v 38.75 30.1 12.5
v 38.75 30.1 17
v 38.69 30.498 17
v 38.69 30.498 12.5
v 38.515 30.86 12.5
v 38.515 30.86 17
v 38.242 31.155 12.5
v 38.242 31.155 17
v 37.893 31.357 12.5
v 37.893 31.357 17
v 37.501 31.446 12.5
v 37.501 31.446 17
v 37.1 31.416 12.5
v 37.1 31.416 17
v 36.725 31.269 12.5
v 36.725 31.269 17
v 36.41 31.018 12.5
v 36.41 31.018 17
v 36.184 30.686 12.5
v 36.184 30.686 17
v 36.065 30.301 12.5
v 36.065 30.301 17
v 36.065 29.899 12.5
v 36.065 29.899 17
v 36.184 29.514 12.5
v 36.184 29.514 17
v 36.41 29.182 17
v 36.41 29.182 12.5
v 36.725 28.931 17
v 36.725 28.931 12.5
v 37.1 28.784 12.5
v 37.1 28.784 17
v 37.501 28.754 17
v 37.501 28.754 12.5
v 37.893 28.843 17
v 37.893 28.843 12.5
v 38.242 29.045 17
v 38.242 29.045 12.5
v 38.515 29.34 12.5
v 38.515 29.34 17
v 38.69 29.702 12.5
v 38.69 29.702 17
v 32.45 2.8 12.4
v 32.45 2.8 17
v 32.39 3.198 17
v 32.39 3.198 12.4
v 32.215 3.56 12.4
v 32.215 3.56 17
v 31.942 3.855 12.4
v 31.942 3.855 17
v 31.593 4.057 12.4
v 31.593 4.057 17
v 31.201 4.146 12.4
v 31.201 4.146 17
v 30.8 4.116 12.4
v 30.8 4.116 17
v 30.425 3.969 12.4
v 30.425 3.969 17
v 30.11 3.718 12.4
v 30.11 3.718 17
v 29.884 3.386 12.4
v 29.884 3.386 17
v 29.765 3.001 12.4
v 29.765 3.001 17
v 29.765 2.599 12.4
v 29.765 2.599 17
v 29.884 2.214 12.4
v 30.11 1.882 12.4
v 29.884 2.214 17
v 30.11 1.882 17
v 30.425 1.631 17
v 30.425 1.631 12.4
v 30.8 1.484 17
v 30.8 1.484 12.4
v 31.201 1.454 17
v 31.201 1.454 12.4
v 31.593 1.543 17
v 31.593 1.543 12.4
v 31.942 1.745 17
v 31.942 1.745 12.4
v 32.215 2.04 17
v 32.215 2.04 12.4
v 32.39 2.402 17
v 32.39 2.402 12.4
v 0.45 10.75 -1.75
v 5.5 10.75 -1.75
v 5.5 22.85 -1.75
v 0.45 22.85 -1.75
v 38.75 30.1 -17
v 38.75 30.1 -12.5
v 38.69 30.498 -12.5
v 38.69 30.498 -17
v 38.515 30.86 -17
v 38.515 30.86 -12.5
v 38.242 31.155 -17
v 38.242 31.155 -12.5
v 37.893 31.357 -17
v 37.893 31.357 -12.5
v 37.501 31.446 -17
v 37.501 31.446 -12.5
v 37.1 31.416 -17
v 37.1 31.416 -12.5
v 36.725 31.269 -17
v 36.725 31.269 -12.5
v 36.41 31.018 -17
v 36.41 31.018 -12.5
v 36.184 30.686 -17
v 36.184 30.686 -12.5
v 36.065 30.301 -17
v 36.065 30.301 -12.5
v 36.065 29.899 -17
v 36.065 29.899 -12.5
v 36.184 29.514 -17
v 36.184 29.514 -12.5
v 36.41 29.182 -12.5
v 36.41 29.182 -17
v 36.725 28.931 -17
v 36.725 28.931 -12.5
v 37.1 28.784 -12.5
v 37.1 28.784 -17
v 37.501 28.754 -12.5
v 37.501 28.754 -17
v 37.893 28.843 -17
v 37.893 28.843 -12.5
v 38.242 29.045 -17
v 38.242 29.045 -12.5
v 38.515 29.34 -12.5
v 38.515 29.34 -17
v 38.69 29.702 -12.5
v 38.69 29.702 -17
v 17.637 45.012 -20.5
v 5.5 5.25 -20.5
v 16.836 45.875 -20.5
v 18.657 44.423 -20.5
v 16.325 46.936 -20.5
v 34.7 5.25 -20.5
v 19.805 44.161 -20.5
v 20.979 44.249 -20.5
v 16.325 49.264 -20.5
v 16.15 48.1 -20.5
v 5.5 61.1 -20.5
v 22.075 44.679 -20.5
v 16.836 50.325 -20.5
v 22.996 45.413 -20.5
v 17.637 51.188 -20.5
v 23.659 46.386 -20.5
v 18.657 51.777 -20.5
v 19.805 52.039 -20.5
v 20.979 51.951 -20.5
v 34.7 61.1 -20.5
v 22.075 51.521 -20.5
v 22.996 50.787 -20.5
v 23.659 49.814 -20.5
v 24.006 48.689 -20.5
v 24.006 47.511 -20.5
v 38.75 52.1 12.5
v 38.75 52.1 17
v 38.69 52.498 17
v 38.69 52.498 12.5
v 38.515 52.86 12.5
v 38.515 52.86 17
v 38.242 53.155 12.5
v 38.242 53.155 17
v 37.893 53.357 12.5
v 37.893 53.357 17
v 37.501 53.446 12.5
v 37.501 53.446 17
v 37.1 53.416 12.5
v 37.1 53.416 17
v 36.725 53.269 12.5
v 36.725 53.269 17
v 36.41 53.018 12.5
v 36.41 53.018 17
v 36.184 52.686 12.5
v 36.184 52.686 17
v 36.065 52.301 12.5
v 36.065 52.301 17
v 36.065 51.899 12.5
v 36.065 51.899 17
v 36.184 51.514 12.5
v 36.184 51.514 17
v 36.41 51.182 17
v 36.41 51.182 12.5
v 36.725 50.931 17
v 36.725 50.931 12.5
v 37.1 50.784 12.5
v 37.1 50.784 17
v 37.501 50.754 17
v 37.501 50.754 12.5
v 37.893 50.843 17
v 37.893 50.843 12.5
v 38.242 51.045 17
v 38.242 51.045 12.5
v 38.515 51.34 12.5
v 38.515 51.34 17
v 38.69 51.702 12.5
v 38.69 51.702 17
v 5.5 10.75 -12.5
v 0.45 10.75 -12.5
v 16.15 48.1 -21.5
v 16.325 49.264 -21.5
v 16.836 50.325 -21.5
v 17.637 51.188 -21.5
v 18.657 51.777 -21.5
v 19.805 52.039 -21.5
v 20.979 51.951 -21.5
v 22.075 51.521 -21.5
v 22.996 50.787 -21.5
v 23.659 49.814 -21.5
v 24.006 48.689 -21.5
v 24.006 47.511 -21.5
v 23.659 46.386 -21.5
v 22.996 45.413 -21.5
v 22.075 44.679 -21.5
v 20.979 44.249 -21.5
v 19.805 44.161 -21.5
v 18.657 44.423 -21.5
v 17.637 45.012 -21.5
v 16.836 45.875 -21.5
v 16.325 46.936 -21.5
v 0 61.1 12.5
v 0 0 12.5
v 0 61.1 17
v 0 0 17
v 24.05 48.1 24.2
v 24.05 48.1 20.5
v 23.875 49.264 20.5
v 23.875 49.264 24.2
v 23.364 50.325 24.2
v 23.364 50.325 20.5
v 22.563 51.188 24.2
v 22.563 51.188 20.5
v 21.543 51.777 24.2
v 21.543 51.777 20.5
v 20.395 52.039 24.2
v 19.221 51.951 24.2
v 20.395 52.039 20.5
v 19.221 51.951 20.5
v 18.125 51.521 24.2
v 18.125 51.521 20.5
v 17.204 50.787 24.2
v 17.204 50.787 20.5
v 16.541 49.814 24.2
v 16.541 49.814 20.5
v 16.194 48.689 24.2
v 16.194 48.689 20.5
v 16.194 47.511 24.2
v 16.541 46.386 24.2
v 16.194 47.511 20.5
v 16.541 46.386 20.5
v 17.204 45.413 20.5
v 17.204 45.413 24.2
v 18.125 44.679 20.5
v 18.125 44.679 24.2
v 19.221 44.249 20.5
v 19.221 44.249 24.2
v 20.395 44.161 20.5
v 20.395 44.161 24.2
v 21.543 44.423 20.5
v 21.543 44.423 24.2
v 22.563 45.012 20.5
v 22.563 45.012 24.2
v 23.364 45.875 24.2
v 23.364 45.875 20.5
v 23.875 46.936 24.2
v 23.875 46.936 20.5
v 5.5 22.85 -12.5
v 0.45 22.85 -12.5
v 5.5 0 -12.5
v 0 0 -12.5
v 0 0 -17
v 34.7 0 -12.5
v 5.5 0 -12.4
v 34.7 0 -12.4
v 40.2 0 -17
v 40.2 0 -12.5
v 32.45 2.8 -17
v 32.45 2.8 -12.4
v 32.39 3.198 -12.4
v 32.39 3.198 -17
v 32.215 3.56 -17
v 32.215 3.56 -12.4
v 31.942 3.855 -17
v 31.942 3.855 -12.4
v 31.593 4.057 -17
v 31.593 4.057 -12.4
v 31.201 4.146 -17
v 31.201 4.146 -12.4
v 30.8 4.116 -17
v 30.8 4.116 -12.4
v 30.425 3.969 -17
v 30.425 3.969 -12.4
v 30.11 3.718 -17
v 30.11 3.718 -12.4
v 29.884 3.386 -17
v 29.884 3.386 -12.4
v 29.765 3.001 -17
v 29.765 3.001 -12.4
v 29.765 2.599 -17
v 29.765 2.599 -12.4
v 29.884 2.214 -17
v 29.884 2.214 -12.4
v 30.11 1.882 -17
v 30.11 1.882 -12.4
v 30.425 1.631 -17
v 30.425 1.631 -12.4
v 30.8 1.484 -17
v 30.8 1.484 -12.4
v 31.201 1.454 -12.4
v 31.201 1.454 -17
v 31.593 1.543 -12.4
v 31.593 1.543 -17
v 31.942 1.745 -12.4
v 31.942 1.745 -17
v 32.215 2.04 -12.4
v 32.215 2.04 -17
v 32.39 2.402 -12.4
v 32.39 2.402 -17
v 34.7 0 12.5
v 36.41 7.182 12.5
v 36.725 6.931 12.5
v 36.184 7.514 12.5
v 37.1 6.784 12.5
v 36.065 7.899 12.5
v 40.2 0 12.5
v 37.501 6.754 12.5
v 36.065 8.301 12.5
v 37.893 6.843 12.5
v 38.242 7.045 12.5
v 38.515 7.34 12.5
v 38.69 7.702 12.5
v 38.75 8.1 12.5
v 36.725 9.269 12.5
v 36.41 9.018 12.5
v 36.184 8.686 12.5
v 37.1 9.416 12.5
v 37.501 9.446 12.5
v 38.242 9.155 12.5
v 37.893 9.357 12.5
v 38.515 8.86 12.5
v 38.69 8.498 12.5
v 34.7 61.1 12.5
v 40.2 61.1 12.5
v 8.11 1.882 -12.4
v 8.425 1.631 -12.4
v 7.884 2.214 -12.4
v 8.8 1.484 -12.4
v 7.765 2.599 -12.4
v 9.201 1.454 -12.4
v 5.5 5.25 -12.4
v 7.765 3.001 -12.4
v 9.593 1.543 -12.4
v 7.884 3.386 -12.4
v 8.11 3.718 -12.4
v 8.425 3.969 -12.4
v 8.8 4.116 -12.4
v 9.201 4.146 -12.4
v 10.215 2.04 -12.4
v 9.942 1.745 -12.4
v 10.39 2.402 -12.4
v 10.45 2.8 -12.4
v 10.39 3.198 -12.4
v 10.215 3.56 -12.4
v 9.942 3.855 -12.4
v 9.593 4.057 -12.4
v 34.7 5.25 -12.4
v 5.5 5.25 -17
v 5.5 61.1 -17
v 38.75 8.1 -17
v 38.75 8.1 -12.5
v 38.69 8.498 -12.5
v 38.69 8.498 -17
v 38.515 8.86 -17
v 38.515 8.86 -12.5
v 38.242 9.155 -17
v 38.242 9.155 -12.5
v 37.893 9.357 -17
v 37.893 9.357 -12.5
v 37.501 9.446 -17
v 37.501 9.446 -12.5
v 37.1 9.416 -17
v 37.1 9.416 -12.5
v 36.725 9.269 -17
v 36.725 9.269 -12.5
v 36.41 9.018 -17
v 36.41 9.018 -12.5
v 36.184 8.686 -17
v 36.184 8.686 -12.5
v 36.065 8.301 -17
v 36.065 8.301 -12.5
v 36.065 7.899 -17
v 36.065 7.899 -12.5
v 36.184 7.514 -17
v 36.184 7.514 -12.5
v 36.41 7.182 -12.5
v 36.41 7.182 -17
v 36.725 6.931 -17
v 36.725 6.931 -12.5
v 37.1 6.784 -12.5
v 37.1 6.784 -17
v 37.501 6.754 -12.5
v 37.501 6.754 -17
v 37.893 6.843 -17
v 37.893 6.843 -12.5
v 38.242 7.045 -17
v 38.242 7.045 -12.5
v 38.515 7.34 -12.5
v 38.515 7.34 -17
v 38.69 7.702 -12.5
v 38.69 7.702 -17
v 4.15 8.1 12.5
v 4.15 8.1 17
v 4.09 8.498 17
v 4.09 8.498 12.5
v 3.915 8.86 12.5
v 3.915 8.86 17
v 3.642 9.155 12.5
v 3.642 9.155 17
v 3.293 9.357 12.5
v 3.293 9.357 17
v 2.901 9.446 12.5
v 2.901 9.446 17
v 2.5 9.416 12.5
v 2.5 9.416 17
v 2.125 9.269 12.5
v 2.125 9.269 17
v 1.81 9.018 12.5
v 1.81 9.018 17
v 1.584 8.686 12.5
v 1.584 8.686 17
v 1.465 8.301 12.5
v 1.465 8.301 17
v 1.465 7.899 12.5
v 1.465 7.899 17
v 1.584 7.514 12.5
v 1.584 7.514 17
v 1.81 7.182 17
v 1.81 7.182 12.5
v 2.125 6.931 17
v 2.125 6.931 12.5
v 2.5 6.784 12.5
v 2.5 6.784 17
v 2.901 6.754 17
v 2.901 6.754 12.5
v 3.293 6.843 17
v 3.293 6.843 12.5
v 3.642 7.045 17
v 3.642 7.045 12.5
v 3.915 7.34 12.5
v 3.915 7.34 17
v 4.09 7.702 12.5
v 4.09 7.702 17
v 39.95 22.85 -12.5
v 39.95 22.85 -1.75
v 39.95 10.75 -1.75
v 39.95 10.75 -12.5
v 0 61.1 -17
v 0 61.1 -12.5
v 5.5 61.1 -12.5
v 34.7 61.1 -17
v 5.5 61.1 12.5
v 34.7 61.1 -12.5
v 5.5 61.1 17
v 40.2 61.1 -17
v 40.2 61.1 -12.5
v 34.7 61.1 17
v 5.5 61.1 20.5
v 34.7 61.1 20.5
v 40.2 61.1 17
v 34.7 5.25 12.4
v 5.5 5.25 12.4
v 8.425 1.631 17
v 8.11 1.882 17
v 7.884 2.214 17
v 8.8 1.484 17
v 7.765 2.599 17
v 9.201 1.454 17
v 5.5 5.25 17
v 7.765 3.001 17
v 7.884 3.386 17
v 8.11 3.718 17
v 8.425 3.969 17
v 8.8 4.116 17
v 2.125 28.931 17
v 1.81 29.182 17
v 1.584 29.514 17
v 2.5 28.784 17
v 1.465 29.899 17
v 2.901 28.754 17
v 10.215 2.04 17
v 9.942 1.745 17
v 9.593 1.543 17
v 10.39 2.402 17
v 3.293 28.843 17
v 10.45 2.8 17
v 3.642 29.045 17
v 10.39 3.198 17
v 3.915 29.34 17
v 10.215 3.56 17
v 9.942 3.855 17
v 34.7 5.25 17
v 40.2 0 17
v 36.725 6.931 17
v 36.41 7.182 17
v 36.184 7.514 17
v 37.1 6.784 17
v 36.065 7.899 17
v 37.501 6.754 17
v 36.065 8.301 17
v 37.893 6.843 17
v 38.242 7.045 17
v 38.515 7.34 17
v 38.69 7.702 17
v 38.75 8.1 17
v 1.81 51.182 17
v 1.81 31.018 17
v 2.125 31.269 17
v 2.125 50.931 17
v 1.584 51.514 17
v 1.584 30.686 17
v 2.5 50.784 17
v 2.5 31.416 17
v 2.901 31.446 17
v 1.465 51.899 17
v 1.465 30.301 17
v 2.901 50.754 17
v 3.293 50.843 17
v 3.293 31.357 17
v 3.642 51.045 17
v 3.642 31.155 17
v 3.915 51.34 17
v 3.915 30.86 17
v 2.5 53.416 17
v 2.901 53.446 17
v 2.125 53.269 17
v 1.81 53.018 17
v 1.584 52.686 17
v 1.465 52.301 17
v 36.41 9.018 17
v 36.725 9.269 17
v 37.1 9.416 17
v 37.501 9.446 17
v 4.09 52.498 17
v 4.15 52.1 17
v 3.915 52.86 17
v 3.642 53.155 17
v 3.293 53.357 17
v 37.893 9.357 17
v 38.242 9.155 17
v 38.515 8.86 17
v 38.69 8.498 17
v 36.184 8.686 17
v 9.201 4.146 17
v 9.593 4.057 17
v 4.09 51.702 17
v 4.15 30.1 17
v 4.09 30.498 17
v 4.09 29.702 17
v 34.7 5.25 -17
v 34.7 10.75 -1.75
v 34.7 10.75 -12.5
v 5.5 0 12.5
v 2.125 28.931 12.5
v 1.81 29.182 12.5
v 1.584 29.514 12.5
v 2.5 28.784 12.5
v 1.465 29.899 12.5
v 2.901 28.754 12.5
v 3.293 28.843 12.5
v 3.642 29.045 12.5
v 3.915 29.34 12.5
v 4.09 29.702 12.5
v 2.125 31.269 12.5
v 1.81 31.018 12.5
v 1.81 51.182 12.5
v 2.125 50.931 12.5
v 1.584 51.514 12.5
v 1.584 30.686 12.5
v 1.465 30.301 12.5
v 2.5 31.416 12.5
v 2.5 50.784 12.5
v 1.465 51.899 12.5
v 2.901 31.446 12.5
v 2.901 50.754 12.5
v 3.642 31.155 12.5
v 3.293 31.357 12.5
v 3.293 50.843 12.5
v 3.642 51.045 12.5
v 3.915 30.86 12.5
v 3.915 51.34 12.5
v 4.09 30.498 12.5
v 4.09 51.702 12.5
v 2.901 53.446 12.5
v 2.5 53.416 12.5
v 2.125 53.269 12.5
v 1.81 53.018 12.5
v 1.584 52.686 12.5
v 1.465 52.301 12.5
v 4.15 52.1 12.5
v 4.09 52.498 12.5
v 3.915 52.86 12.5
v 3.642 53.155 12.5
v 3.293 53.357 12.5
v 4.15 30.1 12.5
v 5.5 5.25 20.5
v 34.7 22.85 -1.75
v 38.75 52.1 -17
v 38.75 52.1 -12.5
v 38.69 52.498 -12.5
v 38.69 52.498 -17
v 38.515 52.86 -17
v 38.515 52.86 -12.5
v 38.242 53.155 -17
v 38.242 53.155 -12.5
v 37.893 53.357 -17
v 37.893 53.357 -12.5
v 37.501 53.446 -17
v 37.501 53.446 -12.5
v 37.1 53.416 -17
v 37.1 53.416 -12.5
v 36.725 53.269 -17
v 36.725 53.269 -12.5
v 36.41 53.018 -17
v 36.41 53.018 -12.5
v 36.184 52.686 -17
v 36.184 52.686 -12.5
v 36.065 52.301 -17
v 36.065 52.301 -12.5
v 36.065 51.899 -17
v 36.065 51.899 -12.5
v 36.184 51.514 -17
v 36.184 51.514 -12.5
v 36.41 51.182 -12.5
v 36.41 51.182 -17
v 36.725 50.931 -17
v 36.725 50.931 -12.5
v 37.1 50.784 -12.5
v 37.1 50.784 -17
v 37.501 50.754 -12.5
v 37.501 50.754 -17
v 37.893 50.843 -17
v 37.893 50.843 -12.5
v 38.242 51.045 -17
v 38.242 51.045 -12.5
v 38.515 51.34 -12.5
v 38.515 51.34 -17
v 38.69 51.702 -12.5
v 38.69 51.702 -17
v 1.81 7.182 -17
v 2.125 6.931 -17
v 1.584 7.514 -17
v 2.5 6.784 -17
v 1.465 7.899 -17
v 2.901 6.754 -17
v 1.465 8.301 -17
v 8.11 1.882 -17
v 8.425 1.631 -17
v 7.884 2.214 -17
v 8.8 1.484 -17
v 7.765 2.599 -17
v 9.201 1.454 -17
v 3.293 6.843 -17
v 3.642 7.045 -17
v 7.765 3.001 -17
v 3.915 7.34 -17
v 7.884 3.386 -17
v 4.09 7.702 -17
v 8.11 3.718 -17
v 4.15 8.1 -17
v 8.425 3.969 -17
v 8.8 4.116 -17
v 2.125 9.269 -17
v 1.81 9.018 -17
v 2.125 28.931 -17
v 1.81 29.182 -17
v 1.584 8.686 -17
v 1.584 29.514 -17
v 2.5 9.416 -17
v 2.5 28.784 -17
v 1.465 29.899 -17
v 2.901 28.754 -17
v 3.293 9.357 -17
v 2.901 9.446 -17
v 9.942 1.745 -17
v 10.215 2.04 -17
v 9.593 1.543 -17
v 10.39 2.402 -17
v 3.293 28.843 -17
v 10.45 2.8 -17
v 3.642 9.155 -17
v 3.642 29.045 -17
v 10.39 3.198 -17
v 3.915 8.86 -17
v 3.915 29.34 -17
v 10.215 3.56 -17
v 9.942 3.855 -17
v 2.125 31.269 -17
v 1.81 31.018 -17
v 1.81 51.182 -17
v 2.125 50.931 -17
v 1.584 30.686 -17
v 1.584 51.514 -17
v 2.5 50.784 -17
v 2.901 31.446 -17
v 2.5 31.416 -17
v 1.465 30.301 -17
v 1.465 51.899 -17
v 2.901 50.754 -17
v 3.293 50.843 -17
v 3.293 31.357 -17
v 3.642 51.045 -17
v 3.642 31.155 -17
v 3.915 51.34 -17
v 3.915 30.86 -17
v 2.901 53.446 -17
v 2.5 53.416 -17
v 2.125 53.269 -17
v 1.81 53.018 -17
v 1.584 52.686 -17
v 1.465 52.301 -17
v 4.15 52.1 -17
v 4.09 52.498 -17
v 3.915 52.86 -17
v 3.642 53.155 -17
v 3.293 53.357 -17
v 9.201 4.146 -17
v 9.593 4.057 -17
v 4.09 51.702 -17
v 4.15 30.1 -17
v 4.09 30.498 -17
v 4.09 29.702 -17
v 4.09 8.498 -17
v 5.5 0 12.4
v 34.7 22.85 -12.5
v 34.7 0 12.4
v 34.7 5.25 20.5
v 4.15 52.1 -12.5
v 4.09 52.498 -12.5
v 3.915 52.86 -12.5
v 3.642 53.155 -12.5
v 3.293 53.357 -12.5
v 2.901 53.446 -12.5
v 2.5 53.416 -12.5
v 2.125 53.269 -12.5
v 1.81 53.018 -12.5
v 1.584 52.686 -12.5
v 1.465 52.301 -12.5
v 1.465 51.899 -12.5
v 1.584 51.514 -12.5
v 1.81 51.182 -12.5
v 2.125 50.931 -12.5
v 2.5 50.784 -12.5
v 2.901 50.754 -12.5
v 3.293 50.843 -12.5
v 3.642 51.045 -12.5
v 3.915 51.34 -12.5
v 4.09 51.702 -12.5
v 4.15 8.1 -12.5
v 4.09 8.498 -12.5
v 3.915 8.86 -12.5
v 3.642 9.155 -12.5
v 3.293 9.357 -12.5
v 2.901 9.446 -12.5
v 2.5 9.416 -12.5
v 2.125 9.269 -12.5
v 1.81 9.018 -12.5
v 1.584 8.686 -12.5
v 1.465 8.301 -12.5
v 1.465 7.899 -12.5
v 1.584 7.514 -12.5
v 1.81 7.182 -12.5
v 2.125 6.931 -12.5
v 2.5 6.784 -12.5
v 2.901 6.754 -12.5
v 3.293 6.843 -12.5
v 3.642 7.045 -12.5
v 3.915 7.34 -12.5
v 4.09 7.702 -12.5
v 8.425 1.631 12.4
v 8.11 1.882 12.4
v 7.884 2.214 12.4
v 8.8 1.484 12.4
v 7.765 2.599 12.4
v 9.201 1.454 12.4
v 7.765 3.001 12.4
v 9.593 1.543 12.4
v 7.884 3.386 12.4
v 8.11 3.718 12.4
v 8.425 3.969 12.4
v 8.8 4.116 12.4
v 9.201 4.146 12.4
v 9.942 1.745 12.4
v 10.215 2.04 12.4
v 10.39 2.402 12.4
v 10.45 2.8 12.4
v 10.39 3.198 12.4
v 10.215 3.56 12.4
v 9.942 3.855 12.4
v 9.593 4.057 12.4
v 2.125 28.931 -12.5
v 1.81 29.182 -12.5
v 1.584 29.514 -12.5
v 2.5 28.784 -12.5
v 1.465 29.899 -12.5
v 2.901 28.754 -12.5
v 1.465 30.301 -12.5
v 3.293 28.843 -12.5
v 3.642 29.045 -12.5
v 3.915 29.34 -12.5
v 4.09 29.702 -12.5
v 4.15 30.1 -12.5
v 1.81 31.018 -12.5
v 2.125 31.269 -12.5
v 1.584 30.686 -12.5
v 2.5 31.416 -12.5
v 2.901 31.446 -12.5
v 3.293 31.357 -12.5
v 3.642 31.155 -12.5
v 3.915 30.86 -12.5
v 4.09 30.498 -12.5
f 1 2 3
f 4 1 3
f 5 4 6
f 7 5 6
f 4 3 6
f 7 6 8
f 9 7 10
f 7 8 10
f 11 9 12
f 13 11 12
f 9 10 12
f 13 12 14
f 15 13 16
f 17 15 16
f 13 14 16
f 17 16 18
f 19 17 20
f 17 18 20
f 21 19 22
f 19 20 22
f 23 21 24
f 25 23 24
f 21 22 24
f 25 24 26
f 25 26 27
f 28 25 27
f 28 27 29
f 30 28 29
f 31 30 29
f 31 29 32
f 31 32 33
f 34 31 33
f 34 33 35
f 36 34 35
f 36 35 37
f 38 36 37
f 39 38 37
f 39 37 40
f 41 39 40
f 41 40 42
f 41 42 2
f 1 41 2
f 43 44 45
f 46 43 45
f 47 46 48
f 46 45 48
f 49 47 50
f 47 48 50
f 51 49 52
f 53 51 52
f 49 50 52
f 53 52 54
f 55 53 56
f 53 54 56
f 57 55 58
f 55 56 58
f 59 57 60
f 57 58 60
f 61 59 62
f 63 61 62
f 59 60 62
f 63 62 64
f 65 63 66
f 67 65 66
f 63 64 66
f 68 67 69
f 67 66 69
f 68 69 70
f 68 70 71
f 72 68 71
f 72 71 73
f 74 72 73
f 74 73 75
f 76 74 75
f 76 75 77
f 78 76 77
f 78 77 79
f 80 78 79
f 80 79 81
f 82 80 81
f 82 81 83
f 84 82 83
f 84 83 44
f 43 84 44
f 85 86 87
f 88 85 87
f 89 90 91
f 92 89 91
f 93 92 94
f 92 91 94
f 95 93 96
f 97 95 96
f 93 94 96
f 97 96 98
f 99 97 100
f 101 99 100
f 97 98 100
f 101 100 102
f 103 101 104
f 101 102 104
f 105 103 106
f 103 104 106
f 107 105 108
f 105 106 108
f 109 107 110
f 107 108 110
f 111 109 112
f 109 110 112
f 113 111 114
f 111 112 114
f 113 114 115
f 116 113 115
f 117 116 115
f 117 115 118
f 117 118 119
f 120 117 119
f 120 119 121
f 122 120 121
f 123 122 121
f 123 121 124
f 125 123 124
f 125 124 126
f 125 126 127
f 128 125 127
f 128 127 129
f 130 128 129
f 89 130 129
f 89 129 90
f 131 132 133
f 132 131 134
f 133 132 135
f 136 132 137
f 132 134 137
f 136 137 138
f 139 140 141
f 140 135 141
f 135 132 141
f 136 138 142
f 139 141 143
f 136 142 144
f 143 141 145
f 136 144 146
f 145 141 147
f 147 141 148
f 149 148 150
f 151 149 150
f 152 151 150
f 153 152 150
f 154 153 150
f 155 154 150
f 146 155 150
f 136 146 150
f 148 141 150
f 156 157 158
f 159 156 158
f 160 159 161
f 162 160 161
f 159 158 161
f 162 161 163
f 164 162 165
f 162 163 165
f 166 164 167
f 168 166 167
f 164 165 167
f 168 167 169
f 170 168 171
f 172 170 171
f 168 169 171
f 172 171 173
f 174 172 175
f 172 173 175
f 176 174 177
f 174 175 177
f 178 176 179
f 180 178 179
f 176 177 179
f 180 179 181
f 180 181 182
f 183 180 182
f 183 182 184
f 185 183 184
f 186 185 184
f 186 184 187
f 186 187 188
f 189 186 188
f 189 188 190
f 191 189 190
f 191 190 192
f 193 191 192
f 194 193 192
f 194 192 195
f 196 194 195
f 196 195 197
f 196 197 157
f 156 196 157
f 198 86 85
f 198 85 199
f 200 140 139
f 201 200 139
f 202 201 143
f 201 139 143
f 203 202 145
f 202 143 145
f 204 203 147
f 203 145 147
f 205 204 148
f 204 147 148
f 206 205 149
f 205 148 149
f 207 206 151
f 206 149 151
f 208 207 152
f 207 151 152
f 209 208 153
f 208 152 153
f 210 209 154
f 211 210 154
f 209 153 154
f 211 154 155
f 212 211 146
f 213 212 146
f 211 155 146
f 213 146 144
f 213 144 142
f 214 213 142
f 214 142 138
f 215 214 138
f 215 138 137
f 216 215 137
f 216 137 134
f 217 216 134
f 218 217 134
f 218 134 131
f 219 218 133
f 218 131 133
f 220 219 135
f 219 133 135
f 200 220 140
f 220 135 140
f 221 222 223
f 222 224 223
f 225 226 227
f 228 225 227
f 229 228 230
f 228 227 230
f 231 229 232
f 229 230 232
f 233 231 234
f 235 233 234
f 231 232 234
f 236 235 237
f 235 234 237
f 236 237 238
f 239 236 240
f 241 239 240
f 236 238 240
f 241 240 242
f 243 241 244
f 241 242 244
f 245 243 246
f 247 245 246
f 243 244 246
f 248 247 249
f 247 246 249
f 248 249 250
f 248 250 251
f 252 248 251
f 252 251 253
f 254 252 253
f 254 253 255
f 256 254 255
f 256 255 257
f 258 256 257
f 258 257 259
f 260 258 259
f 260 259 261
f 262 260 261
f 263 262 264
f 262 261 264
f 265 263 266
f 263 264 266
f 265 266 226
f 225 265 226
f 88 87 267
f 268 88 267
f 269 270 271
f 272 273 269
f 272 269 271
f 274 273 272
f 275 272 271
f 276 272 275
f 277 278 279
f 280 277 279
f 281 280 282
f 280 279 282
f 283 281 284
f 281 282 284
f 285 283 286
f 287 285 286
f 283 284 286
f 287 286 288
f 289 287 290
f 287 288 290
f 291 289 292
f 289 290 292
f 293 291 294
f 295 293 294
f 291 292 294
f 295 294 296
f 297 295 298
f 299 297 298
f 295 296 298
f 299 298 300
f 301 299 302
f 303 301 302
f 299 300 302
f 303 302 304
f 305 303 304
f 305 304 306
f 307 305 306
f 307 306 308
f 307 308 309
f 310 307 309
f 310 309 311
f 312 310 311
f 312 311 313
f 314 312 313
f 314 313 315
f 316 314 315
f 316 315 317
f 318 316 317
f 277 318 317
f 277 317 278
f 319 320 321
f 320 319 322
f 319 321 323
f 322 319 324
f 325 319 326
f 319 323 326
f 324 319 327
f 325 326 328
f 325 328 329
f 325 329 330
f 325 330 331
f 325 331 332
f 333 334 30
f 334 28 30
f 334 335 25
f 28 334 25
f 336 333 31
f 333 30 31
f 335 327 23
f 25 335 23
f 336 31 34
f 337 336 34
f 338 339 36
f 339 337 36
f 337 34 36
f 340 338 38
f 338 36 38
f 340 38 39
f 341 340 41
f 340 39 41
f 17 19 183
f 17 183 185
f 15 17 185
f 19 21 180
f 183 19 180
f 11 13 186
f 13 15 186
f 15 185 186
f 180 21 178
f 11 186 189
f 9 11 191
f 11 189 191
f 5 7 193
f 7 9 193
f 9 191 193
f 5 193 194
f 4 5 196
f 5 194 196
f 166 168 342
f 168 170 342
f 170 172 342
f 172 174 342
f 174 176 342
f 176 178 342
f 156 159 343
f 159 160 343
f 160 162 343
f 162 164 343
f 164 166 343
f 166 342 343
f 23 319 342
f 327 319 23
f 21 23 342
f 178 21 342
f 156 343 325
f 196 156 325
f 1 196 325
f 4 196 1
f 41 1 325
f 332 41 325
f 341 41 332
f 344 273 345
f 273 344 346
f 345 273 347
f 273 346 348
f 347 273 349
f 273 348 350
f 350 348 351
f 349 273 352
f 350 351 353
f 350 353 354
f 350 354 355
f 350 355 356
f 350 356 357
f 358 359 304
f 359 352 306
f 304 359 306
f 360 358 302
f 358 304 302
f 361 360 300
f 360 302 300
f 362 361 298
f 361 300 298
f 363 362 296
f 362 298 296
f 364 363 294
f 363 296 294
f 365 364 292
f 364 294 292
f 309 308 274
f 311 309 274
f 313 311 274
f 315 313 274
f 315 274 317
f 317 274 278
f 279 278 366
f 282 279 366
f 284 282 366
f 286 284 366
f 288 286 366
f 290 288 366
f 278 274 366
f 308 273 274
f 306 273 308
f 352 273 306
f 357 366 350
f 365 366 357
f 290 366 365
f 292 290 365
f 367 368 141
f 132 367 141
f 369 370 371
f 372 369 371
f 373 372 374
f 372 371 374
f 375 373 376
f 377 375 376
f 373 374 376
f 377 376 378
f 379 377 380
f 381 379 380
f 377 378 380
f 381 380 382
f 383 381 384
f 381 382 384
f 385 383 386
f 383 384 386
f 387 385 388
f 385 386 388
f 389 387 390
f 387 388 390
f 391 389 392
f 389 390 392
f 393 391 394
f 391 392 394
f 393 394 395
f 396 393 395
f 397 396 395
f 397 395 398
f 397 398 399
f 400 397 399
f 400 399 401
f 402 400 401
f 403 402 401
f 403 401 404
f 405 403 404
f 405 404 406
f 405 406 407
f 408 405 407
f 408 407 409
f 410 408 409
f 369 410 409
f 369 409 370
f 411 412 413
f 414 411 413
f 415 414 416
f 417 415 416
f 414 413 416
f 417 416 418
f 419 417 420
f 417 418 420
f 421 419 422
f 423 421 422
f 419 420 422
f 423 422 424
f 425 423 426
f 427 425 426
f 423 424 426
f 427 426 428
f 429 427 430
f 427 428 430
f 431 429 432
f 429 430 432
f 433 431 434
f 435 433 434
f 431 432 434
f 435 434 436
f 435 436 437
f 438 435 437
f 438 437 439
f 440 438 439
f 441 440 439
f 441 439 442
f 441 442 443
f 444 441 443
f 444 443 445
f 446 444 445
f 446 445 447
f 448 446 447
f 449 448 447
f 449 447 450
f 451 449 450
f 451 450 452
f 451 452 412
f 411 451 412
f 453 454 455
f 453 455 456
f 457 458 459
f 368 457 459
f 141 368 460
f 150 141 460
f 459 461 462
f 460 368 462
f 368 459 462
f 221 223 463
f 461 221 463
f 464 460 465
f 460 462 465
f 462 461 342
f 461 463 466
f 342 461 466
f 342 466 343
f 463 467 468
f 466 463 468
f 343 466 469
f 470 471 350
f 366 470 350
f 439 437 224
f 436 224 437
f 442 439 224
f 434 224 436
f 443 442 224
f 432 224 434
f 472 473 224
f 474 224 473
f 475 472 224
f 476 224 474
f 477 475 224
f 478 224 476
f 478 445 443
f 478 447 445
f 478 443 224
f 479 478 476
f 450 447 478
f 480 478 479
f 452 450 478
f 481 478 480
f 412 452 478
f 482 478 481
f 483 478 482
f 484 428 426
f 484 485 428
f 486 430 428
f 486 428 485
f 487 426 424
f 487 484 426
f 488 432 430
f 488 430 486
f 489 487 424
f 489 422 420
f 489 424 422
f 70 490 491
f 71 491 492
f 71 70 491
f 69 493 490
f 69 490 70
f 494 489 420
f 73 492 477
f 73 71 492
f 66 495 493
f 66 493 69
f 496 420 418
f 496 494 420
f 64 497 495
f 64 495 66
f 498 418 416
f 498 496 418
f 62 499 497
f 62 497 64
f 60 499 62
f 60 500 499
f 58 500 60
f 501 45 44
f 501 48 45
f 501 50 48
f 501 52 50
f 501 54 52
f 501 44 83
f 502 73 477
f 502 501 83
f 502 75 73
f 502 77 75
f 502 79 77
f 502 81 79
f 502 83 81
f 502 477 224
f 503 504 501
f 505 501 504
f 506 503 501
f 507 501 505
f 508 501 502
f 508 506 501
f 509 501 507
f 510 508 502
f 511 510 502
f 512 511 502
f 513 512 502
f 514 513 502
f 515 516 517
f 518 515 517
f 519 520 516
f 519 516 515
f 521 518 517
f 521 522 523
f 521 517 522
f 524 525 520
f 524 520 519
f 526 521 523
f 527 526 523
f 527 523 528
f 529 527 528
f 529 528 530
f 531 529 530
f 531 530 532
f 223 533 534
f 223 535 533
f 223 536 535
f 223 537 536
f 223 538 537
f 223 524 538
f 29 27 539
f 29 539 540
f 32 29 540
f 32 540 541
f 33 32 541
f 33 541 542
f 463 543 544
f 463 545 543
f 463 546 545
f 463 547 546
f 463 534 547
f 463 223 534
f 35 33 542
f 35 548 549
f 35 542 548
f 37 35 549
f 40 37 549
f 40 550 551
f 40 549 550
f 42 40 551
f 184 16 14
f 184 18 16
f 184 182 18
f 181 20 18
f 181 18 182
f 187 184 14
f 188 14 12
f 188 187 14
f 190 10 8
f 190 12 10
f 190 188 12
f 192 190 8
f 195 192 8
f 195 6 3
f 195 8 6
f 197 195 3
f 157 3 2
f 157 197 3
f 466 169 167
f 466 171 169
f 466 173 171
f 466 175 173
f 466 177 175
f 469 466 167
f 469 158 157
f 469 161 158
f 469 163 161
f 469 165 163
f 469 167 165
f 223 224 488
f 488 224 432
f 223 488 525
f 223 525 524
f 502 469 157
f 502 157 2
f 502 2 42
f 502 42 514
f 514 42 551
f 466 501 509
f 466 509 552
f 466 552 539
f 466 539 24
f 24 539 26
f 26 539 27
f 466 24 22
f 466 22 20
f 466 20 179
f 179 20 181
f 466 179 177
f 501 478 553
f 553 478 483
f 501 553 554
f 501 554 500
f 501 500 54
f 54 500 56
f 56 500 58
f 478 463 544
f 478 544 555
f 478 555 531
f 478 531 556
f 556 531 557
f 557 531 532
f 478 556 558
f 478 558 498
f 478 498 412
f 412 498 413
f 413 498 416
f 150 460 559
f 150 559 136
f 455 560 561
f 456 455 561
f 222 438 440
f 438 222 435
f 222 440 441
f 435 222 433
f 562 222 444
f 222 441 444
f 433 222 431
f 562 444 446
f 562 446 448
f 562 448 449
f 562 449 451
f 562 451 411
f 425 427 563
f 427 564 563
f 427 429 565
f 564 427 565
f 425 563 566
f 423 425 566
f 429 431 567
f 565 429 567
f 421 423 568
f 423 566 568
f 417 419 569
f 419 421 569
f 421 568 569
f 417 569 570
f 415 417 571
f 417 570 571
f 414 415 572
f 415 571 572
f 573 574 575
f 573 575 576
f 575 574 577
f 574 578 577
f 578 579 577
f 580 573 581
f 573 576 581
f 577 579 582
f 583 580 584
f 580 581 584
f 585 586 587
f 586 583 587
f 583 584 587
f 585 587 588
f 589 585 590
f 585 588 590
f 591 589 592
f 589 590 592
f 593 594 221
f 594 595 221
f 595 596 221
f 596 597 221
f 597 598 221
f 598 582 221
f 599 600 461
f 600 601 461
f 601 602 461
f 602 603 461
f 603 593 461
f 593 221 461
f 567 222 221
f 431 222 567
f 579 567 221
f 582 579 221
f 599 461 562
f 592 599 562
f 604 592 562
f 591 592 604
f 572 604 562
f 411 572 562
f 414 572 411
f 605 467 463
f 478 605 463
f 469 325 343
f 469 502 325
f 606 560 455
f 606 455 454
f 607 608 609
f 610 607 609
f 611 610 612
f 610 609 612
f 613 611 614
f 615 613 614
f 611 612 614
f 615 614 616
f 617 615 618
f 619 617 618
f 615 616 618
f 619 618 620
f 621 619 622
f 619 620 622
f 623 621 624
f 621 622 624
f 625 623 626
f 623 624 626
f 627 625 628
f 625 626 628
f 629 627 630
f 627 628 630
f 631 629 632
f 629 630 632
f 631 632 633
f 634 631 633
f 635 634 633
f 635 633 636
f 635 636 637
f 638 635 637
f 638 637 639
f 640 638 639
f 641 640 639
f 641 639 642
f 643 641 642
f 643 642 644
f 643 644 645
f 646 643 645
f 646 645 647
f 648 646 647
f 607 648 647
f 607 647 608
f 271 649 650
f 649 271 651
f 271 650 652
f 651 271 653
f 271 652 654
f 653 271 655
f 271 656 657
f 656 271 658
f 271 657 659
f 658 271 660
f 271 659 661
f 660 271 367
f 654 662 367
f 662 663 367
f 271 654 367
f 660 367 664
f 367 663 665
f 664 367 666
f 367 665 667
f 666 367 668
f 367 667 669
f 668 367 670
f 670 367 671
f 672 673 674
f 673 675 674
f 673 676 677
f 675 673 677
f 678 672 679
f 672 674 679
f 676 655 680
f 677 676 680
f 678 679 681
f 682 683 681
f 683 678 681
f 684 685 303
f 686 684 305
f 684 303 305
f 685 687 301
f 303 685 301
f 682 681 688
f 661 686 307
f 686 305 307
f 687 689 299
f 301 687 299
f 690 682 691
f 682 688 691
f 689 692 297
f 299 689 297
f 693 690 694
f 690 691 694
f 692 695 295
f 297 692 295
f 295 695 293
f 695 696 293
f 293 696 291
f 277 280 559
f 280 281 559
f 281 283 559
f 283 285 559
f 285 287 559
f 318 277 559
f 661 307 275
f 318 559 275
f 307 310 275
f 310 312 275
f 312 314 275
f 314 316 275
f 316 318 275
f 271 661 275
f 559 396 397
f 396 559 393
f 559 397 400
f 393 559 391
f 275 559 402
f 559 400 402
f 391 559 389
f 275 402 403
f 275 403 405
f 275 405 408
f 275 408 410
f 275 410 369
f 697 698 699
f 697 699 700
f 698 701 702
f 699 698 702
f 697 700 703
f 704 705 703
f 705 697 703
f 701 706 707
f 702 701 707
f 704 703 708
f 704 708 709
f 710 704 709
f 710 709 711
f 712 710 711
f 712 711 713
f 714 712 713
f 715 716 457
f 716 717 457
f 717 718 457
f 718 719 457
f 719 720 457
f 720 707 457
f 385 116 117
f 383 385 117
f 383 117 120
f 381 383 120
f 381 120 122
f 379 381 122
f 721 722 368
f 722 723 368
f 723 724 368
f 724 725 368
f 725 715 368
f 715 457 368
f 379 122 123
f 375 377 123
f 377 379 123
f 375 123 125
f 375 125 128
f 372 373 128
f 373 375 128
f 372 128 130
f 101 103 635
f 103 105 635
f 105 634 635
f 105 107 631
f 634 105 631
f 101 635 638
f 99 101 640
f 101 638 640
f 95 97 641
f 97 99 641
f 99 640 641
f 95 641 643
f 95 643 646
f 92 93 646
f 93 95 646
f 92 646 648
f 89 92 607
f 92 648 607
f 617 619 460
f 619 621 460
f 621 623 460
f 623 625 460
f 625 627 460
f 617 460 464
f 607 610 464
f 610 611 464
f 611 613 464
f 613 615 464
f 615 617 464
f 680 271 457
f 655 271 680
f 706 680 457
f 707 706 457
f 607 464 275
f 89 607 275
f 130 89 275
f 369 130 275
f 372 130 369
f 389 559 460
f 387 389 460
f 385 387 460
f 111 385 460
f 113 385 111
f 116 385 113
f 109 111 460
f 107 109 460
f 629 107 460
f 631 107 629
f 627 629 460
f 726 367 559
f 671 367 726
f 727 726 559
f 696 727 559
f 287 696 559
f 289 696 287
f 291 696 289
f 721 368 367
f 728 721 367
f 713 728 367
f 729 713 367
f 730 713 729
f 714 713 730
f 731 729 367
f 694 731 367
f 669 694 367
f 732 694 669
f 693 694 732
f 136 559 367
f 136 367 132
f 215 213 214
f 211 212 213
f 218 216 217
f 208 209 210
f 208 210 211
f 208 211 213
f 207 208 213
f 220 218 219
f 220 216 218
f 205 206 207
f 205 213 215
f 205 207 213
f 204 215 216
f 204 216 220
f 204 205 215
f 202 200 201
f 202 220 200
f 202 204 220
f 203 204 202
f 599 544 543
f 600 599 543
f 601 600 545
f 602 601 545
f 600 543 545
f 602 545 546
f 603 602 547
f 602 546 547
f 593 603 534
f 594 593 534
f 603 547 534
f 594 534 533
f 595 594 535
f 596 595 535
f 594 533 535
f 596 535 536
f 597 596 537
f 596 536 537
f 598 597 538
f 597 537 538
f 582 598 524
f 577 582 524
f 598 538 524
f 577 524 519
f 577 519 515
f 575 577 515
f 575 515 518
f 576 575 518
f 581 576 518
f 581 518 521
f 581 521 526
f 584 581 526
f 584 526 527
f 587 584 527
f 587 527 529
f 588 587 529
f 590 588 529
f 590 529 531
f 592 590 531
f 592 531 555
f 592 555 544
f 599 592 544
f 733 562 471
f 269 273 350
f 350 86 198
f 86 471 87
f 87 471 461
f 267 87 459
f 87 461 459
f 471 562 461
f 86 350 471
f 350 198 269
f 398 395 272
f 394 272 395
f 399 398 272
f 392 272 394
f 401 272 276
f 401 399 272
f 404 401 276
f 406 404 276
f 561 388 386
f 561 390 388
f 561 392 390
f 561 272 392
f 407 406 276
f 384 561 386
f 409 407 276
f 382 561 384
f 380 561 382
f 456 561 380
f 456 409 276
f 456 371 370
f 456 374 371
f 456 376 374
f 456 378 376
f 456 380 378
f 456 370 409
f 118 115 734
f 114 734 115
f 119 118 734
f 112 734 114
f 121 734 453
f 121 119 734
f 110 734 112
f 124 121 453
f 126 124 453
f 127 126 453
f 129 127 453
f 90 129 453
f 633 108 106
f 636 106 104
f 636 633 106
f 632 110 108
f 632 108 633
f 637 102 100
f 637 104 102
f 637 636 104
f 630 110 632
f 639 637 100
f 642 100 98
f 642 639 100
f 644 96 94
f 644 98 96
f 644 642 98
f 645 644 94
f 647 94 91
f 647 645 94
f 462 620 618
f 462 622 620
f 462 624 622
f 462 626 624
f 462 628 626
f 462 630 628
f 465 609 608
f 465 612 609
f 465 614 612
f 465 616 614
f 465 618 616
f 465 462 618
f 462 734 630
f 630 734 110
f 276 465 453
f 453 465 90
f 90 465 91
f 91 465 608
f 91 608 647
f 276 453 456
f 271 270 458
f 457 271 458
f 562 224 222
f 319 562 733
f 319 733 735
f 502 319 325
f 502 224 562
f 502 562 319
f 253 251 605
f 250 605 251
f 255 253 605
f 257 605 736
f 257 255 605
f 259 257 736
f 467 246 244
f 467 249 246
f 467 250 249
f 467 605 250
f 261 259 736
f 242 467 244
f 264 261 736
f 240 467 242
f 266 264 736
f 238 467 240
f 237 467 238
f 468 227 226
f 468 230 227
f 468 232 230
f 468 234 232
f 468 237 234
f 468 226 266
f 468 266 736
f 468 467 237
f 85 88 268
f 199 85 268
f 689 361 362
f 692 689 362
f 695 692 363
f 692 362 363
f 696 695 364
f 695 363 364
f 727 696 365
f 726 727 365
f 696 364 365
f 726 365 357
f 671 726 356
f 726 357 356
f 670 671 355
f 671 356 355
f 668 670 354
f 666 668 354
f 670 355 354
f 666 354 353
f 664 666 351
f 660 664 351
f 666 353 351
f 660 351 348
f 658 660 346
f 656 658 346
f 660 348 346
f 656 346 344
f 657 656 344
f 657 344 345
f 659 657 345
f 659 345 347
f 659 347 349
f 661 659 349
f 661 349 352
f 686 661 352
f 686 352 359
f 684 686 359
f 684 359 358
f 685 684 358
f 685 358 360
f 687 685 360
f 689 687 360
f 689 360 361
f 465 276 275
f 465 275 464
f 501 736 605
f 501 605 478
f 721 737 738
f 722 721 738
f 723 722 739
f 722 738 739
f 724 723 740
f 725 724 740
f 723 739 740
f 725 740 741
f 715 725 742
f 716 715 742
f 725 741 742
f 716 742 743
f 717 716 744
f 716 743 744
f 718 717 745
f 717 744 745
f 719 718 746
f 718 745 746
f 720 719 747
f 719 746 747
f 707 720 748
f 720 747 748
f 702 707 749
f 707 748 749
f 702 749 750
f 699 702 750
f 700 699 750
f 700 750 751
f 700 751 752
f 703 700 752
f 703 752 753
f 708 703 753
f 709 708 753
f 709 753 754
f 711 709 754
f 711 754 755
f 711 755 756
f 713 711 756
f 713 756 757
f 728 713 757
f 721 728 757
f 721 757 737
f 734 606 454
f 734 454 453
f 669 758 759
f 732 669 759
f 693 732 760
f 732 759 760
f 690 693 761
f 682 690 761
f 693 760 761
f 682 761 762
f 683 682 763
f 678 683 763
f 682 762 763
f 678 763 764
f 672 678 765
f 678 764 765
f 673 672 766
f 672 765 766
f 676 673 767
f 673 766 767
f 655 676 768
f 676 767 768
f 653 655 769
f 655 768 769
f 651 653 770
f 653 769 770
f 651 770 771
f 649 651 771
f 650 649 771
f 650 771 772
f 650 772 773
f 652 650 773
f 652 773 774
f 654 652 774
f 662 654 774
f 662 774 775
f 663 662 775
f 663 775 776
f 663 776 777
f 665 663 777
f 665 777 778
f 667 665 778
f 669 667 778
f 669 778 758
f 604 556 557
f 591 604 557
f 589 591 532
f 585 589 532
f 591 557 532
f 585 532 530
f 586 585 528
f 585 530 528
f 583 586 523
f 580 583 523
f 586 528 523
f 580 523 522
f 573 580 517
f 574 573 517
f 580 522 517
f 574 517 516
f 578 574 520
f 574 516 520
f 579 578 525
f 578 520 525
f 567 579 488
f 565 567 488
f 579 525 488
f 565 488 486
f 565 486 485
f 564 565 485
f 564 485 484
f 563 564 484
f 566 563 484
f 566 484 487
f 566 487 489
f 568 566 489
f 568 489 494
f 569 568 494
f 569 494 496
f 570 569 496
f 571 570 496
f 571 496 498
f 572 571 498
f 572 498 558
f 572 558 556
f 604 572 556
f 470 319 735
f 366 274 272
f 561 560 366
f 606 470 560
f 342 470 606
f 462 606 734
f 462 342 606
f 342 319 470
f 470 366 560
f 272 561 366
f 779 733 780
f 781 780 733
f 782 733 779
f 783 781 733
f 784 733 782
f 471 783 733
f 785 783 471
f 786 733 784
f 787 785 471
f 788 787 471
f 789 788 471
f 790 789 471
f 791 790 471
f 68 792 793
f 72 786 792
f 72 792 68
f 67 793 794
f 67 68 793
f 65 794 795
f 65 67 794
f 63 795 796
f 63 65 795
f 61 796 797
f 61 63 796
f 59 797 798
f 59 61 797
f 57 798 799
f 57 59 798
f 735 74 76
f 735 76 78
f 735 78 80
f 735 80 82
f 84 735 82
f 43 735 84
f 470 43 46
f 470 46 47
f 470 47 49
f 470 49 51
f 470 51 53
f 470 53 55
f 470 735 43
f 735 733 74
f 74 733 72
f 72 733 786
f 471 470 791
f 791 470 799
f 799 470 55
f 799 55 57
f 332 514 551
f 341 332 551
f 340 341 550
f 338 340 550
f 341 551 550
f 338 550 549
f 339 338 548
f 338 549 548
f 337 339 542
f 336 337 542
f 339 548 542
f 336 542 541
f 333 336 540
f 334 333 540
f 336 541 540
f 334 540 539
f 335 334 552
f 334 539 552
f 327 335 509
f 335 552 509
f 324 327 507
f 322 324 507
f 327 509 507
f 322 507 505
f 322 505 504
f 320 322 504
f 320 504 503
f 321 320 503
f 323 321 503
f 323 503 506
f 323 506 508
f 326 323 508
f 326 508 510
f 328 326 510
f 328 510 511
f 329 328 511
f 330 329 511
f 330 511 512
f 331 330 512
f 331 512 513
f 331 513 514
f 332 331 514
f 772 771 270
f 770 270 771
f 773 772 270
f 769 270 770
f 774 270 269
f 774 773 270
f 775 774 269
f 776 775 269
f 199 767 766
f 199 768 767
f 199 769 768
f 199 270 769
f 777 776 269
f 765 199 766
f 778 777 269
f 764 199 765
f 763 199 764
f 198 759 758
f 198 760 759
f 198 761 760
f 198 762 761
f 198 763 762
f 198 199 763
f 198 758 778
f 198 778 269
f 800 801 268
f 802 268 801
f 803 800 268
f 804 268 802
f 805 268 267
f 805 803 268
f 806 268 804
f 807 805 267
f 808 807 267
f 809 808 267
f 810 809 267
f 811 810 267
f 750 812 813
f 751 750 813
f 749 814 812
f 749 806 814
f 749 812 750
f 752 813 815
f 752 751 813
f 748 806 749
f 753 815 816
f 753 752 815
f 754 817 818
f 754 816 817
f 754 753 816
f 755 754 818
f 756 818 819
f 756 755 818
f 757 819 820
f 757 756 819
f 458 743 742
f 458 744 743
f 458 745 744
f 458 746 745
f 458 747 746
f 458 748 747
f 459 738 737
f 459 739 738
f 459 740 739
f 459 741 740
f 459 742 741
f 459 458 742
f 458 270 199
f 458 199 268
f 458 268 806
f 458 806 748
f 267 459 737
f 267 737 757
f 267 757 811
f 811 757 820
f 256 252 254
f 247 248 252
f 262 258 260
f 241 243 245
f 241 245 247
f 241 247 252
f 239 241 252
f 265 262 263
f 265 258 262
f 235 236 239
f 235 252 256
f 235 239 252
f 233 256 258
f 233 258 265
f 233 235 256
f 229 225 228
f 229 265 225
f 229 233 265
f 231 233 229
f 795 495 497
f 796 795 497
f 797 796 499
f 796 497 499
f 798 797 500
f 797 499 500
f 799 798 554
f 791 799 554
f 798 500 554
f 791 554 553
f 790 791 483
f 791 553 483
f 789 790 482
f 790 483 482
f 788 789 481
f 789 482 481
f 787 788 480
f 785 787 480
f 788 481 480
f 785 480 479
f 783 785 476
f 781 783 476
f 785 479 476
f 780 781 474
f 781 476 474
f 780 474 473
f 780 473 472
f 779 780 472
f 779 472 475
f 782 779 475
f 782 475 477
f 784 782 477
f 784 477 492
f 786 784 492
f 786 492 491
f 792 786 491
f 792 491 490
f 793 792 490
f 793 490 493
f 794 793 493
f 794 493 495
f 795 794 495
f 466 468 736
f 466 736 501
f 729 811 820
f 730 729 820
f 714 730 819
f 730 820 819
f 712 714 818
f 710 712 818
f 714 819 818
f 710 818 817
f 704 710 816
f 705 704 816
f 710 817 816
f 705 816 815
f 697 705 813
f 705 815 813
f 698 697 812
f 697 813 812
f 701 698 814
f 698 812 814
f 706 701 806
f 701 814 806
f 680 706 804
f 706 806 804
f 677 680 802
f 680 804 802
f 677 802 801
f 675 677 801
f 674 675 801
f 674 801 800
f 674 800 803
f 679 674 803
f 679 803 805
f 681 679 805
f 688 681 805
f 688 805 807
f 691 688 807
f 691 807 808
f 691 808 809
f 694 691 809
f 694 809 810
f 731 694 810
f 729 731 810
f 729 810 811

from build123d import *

# Parameters (mm, degrees)
SKETCH_2_W           = 40.2
SKETCH_2_H           = 61.1
EXTRUDE_1_DEPTH      = 20.5
SKETCH_9_W           = 24.8
SKETCH_9_H           = 5.25
SKETCH_9_W_2         = 3.5
CUT_EXTRUDE_3_DEPTH  = 41.2
SKETCH_10_W          = 5.5
SKETCH_10_H          = 25
SKETCH_10_H_2        = 3.5
CUT_EXTRUDE_4_DEPTH  = 62.1
SKETCH_12_R          = 1.35
CUT_EXTRUDE_5_DEPTH  = 42
SKETCH_13_R          = 3.95
EXTRUDE_2_DEPTH      = 3.7
SKETCH_14_R          = 3.95
EXTRUDE_4_DEPTH      = 1
SKETCH_16_W          = 10.75
SKETCH_16_H          = 12.1
EXTRUDE_6_DEPTH      = 5.25
EXTRUDE_6_DEPTH_BACK = 34.25


with BuildPart() as part:
    # 스케치2 → 보스-돌출1 (new body, symmetric)
    with BuildSketch(Plane.XY):
        with Locations((20.1, 30.55)):
            Rectangle(SKETCH_2_W, SKETCH_2_H)
    extrude(amount=EXTRUDE_1_DEPTH, both=True)

    # 스케치9 → 컷-돌출3 (cut, through all)
    with BuildSketch(Plane(origin=(40.2, 0, 0), x_dir=(0, 0, -1), z_dir=(1, 0, 0))):
        with Locations((0, 2.625)):
            Rectangle(SKETCH_9_W, SKETCH_9_H)
        with Locations((-18.75, 2.625)):
            Rectangle(SKETCH_9_W_2, SKETCH_9_H)
        with Locations((18.75, 2.625)):
            Rectangle(SKETCH_9_W_2, SKETCH_9_H)
    extrude(amount=-CUT_EXTRUDE_3_DEPTH, mode=Mode.SUBTRACT)

    # 스케치10 → 컷-돌출4 (cut, through all)
    with BuildSketch(Plane(origin=(0, 61.1, 0), x_dir=(1, 0, 0), z_dir=(0, 1, 0))):
        with Locations((2.75, 0)):
            Rectangle(SKETCH_10_W, SKETCH_10_H)
        with Locations((2.75, 18.75)):
            Rectangle(SKETCH_10_W, SKETCH_10_H_2)
        with Locations((37.45, 0)):
            Rectangle(SKETCH_10_W, SKETCH_10_H)
        with Locations((37.45, 18.75)):
            Rectangle(SKETCH_10_W, SKETCH_10_H_2)
        with Locations((2.75, -18.75)):
            Rectangle(SKETCH_10_W, SKETCH_10_H_2)
        with Locations((37.45, -18.75)):
            Rectangle(SKETCH_10_W, SKETCH_10_H_2)
    extrude(amount=-CUT_EXTRUDE_4_DEPTH, mode=Mode.SUBTRACT)

    # 스케치12 → 컷-돌출5 (cut, through all)
    with BuildSketch(Plane.XY.offset(20.5)):
        with Locations((9.1, 2.8)):
            Circle(SKETCH_12_R)
        with Locations((31.1, 2.8)):
            Circle(SKETCH_12_R)
        with Locations((2.8, 52.1)):
            Circle(SKETCH_12_R)
        with Locations((37.4, 52.1)):
            Circle(SKETCH_12_R)
        with Locations((2.8, 30.1)):
            Circle(SKETCH_12_R)
        with Locations((37.4, 30.1)):
            Circle(SKETCH_12_R)
        with Locations((2.8, 8.1)):
            Circle(SKETCH_12_R)
        with Locations((37.4, 8.1)):
            Circle(SKETCH_12_R)
    extrude(amount=-CUT_EXTRUDE_5_DEPTH, mode=Mode.SUBTRACT)

    # 스케치13 → 보스-돌출2 (add)
    with BuildSketch(Plane.XY.offset(20.5)):
        with Locations((20.1, 48.1)):
            Circle(SKETCH_13_R)
    extrude(amount=EXTRUDE_2_DEPTH)

    # 스케치14 → 보스-돌출4 (add)
    with BuildSketch(Plane(origin=(0, 0, -20.5), x_dir=(-1, 0, 0), z_dir=(0, 0, -1))):
        with Locations((-20.1, 48.1)):
            Circle(SKETCH_14_R)
    extrude(amount=EXTRUDE_4_DEPTH)

    # 스케치16 → 보스-돌출6 (add, two sides)
    with BuildSketch(Plane(origin=(34.7, 0, 0), x_dir=(0, 0, -1), z_dir=(1, 0, 0))) as extrude_6_sk:
        with Locations((7.125, 16.8)):
            Rectangle(SKETCH_16_W, SKETCH_16_H)
    extrude(amount=EXTRUDE_6_DEPTH)
    extrude(extrude_6_sk.sketch, amount=-EXTRUDE_6_DEPTH_BACK)


solid = part.part
